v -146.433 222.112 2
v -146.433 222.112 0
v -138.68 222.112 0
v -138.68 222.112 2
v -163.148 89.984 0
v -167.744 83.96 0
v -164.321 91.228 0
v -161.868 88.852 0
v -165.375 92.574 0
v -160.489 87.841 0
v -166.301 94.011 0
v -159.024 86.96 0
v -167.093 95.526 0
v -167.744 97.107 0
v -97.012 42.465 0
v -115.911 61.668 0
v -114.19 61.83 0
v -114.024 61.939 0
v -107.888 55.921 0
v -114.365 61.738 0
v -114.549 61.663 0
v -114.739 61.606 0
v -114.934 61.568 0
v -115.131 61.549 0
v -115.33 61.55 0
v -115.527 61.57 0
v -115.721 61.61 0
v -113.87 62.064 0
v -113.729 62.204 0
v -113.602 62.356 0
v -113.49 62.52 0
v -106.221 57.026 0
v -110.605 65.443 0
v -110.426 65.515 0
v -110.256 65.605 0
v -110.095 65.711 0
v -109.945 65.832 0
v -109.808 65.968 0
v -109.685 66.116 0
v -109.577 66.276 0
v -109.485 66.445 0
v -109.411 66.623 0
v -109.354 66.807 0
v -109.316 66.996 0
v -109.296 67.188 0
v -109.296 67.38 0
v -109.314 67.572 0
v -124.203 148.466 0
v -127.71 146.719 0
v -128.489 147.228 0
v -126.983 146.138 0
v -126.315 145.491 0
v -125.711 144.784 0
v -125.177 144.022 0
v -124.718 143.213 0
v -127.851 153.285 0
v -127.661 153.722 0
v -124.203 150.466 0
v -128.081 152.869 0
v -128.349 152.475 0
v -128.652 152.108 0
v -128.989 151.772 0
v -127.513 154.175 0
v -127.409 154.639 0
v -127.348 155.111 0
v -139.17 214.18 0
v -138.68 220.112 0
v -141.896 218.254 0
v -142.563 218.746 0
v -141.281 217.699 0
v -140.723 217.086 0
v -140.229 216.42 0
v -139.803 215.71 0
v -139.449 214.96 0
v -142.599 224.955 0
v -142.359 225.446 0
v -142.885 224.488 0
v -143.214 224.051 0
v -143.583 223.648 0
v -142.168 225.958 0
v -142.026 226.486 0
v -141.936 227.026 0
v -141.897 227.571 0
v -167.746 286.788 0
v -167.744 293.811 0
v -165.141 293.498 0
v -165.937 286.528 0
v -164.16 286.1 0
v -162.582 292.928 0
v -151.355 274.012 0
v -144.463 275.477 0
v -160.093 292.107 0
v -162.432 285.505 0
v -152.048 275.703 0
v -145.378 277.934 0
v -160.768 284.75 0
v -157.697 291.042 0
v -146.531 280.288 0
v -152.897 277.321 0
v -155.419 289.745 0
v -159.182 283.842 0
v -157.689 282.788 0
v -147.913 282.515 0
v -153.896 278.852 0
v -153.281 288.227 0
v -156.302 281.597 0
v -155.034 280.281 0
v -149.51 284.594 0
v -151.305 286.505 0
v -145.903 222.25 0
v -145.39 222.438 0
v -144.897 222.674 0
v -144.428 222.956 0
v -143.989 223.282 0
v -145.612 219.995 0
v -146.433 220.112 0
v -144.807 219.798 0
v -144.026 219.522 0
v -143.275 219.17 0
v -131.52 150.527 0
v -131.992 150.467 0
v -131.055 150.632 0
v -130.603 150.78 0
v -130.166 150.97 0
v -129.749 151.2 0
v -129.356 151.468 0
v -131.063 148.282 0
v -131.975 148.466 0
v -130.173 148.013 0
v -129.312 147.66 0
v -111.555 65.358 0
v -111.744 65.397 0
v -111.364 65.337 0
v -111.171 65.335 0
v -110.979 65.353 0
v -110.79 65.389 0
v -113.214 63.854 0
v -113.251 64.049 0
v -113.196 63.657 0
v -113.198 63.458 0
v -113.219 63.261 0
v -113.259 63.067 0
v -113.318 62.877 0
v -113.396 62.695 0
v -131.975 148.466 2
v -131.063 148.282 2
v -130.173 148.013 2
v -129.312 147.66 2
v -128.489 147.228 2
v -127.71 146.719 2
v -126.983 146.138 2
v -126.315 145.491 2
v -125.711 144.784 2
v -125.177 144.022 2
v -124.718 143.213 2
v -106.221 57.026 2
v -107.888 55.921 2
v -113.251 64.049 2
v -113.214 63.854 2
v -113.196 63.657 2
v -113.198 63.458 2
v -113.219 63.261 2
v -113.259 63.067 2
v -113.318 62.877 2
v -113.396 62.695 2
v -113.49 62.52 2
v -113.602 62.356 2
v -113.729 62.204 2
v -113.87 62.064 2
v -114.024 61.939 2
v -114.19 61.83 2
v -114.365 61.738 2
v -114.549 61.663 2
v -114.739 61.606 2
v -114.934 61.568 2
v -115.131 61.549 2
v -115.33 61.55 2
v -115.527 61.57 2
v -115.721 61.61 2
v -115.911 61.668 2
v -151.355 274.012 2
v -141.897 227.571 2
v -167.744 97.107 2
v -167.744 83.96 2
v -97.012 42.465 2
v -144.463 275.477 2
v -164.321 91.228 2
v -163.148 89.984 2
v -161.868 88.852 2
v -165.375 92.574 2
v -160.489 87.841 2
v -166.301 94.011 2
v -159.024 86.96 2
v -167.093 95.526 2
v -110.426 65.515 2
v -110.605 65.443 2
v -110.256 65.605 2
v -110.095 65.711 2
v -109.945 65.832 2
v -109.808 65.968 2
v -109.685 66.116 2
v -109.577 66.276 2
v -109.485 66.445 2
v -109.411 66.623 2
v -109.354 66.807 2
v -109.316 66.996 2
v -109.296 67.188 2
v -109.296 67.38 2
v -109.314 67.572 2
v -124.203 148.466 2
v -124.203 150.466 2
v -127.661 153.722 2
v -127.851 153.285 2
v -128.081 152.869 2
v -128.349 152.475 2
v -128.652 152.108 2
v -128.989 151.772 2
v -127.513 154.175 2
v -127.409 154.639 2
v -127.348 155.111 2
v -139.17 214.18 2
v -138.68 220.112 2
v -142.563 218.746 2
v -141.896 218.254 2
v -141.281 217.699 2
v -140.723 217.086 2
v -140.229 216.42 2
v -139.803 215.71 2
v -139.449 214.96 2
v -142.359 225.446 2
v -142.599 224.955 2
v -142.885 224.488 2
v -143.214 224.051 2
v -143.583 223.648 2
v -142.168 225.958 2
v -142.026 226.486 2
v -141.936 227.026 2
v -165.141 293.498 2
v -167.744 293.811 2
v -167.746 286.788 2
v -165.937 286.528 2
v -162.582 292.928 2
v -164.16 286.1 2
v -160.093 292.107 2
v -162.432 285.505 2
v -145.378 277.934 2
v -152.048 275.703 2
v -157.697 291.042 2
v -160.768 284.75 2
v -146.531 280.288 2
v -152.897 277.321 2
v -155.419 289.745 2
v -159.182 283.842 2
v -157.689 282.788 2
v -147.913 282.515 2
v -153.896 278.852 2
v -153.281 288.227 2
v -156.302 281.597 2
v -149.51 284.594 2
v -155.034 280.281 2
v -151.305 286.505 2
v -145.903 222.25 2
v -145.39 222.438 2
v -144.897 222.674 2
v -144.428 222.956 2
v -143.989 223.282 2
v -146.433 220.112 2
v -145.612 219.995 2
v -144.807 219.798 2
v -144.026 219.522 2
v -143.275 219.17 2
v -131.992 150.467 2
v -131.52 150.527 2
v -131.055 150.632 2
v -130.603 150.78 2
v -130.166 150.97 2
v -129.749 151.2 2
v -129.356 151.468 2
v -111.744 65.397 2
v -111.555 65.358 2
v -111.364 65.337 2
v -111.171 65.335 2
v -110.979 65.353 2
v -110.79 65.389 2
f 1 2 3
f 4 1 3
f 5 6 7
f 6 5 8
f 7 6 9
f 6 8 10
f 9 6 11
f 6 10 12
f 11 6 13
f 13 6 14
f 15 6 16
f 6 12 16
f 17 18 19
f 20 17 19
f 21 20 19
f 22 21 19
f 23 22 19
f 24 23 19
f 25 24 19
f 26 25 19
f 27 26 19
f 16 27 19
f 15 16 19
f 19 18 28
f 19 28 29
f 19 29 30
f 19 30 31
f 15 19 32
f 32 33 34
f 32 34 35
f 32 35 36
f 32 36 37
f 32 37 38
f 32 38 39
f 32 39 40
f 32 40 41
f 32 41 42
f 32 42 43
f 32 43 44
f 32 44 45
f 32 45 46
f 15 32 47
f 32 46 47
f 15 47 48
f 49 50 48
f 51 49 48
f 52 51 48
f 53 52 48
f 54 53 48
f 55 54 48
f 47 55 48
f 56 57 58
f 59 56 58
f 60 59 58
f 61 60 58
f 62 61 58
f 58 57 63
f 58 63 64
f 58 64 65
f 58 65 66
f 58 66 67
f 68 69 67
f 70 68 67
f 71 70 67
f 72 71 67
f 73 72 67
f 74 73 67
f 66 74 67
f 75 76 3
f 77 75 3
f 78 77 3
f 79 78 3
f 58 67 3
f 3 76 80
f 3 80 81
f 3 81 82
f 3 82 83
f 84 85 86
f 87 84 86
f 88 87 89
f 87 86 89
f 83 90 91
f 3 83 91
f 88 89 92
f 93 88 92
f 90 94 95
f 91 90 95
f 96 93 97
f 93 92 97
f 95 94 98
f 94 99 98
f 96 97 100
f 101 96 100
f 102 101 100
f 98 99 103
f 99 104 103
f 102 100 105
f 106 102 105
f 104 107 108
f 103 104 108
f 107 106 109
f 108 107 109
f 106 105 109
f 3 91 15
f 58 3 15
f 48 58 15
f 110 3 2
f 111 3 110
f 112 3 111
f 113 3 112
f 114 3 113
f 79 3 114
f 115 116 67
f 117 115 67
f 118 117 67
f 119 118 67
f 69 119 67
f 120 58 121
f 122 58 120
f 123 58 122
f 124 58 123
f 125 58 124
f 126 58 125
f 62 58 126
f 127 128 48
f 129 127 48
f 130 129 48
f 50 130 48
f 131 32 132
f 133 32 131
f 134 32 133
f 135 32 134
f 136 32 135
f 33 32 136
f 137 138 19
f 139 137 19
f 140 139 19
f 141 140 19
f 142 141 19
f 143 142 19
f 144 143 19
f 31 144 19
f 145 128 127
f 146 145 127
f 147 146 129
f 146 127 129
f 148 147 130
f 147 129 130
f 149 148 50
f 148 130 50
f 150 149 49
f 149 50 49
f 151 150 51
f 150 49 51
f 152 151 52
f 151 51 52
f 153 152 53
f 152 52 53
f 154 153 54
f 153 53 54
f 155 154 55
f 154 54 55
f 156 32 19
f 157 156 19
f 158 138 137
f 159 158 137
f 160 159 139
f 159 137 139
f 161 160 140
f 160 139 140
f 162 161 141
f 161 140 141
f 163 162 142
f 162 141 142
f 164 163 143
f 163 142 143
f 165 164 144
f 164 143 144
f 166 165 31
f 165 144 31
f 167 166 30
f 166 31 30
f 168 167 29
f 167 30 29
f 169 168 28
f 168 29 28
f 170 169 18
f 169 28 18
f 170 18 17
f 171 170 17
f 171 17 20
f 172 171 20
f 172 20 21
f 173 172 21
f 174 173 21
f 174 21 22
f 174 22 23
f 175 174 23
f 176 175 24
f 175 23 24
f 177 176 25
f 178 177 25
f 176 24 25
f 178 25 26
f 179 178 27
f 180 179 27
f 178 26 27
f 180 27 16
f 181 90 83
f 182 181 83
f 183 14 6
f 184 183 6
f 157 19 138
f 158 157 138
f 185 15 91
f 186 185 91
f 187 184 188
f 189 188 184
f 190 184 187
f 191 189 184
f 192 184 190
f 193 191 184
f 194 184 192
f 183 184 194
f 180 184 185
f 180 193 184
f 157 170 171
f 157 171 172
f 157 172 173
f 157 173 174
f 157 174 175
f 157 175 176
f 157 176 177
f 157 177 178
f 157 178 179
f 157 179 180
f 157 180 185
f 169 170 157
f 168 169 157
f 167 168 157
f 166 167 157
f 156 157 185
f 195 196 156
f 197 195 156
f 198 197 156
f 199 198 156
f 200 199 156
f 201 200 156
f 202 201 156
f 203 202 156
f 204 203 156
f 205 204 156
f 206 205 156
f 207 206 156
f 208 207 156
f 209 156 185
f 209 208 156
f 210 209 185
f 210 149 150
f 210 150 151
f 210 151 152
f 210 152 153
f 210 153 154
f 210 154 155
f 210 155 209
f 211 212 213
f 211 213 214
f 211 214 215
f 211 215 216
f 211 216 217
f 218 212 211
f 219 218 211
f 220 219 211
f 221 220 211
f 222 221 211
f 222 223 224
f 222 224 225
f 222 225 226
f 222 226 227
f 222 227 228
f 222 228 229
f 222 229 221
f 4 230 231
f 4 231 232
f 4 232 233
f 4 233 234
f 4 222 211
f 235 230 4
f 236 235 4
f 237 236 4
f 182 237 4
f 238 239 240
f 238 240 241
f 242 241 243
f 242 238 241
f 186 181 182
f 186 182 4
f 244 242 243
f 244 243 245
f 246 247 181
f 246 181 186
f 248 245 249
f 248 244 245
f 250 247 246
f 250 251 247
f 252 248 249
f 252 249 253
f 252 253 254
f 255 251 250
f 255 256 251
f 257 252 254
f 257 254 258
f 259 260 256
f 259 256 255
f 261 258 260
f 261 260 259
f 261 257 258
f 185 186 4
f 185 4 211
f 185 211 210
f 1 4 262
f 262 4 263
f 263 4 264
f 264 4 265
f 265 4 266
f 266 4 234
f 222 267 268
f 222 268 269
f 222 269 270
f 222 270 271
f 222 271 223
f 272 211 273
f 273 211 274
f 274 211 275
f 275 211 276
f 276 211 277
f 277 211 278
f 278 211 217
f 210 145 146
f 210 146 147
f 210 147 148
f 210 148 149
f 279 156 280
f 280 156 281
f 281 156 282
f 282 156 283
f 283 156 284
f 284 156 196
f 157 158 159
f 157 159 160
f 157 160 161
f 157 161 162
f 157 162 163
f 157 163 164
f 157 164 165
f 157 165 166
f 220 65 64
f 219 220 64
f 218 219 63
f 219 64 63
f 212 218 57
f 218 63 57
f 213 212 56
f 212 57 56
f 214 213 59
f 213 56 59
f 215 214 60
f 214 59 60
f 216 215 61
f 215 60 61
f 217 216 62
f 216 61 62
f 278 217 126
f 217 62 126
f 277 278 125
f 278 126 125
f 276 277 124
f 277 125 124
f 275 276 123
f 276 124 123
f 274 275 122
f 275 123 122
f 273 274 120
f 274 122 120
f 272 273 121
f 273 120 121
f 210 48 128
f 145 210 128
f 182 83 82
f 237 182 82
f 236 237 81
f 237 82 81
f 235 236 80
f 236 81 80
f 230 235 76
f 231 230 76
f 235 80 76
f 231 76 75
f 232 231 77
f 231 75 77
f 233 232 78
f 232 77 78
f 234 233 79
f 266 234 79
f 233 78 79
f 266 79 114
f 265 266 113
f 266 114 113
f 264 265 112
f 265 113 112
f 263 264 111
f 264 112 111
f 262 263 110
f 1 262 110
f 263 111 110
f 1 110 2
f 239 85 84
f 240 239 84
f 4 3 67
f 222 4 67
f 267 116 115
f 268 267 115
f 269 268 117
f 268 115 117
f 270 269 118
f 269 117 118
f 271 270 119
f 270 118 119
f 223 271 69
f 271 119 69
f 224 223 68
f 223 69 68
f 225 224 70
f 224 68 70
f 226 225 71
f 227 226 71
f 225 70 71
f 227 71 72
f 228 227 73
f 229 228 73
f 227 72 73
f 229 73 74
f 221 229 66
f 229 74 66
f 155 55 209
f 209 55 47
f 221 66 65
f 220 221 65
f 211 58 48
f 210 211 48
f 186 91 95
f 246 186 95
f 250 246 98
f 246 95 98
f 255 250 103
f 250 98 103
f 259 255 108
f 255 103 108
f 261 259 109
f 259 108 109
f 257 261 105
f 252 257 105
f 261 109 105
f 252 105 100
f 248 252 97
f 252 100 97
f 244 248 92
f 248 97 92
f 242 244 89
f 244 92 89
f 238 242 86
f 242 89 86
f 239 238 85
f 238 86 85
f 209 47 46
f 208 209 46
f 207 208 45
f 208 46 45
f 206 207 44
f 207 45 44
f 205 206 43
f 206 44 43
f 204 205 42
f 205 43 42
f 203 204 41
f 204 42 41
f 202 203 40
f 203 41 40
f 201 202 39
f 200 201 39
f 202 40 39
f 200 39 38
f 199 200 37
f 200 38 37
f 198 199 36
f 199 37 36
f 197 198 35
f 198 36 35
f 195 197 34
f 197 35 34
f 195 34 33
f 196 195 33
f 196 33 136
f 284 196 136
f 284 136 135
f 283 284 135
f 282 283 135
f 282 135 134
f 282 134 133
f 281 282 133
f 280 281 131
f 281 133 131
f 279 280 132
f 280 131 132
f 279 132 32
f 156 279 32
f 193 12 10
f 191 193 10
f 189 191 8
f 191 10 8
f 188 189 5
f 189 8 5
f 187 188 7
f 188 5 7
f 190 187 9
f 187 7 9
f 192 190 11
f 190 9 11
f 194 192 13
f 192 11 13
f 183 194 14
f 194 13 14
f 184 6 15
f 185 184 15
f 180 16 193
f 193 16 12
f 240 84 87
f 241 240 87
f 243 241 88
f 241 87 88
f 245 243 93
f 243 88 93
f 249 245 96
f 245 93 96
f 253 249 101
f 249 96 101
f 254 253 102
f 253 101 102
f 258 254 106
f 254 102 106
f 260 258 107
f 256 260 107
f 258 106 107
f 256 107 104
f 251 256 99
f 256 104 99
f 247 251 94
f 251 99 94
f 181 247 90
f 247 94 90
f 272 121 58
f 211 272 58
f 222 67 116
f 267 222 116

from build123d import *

# Parameters (mm, degrees)
EXTRUDE_1_DEPTH = 2


with BuildPart() as part:
    # Model → 凸台-拉伸1 (new body)
    with BuildSketch(Plane.XY):
        with BuildLine():
            Line((-97.011702464, 42.464925797), (-144.463489001, 275.476643049))
            ThreePointArc((-144.463489001, 275.476643049), (-153.281496848, 288.227053848), (-167.743625943, 293.810696025))
            Line((-167.743625943, 293.810696025), (-167.745826906, 286.787604353))
            ThreePointArc((-167.745826906, 286.787604353), (-157.689004232, 282.787697452), (-151.354655659, 274.011880359))
            Line((-151.354655659, 274.011880359), (-141.897210514, 227.57115189))
            ThreePointArc((-141.897210514, 227.57115189), (-143.213550528, 224.051355827), (-146.432560896, 222.112364438))
            Line((-146.432560896, 222.112364438), (-138.679952298, 222.112364438))
            Line((-138.679952298, 222.112364438), (-138.679952298, 220.112364438))
            Line((-138.679952298, 220.112364438), (-146.432560896, 220.112364438))
            ThreePointArc((-146.432560896, 220.112364438), (-141.8960614, 218.254319099), (-139.170128432, 214.179831448))
            Line((-139.170128432, 214.179831448), (-127.347591585, 155.11105785))
            ThreePointArc((-127.347591585, 155.11105785), (-128.81680318, 151.936000766), (-131.991729699, 150.466507045))
            Line((-131.991729699, 150.466507045), (-124.202532501, 150.465561187))
            Line((-124.202532501, 150.465561187), (-124.202532501, 148.465561187))
            Line((-124.202532501, 148.465561187), (-131.975142876, 148.465561187))
            ThreePointArc((-131.975142876, 148.465561187), (-127.709998786, 146.718869515), (-124.718064663, 143.213057753))
            Line((-124.718064663, 143.213057753), (-109.314139037, 67.572172034))
            ThreePointArc((-109.314139037, 67.572172034), (-109.945142677, 65.832332797), (-111.744040834, 65.397394195))
            Line((-111.744040834, 65.397394195), (-106.221436179, 57.026239152))
            Line((-106.221436179, 57.026239152), (-107.888289044, 55.920988197))
            Line((-107.888289044, 55.920988197), (-113.250526418, 64.049079845))
            ThreePointArc((-113.250526418, 64.049079845), (-113.869929217, 62.064275394), (-115.91101166, 61.66792833))
            Line((-115.91101166, 61.66792833), (-159.023635769, 86.960168667))
            ThreePointArc((-159.023635769, 86.960168667), (-164.320624855, 91.228378401), (-167.743625943, 97.107049276))
            Line((-167.743625943, 97.107049276), (-167.743625943, 83.960168667))
            Line((-167.743625943, 83.960168667), (-97.011702464, 42.464925797))
        make_face()
    extrude(amount=EXTRUDE_1_DEPTH)


solid = part.part
